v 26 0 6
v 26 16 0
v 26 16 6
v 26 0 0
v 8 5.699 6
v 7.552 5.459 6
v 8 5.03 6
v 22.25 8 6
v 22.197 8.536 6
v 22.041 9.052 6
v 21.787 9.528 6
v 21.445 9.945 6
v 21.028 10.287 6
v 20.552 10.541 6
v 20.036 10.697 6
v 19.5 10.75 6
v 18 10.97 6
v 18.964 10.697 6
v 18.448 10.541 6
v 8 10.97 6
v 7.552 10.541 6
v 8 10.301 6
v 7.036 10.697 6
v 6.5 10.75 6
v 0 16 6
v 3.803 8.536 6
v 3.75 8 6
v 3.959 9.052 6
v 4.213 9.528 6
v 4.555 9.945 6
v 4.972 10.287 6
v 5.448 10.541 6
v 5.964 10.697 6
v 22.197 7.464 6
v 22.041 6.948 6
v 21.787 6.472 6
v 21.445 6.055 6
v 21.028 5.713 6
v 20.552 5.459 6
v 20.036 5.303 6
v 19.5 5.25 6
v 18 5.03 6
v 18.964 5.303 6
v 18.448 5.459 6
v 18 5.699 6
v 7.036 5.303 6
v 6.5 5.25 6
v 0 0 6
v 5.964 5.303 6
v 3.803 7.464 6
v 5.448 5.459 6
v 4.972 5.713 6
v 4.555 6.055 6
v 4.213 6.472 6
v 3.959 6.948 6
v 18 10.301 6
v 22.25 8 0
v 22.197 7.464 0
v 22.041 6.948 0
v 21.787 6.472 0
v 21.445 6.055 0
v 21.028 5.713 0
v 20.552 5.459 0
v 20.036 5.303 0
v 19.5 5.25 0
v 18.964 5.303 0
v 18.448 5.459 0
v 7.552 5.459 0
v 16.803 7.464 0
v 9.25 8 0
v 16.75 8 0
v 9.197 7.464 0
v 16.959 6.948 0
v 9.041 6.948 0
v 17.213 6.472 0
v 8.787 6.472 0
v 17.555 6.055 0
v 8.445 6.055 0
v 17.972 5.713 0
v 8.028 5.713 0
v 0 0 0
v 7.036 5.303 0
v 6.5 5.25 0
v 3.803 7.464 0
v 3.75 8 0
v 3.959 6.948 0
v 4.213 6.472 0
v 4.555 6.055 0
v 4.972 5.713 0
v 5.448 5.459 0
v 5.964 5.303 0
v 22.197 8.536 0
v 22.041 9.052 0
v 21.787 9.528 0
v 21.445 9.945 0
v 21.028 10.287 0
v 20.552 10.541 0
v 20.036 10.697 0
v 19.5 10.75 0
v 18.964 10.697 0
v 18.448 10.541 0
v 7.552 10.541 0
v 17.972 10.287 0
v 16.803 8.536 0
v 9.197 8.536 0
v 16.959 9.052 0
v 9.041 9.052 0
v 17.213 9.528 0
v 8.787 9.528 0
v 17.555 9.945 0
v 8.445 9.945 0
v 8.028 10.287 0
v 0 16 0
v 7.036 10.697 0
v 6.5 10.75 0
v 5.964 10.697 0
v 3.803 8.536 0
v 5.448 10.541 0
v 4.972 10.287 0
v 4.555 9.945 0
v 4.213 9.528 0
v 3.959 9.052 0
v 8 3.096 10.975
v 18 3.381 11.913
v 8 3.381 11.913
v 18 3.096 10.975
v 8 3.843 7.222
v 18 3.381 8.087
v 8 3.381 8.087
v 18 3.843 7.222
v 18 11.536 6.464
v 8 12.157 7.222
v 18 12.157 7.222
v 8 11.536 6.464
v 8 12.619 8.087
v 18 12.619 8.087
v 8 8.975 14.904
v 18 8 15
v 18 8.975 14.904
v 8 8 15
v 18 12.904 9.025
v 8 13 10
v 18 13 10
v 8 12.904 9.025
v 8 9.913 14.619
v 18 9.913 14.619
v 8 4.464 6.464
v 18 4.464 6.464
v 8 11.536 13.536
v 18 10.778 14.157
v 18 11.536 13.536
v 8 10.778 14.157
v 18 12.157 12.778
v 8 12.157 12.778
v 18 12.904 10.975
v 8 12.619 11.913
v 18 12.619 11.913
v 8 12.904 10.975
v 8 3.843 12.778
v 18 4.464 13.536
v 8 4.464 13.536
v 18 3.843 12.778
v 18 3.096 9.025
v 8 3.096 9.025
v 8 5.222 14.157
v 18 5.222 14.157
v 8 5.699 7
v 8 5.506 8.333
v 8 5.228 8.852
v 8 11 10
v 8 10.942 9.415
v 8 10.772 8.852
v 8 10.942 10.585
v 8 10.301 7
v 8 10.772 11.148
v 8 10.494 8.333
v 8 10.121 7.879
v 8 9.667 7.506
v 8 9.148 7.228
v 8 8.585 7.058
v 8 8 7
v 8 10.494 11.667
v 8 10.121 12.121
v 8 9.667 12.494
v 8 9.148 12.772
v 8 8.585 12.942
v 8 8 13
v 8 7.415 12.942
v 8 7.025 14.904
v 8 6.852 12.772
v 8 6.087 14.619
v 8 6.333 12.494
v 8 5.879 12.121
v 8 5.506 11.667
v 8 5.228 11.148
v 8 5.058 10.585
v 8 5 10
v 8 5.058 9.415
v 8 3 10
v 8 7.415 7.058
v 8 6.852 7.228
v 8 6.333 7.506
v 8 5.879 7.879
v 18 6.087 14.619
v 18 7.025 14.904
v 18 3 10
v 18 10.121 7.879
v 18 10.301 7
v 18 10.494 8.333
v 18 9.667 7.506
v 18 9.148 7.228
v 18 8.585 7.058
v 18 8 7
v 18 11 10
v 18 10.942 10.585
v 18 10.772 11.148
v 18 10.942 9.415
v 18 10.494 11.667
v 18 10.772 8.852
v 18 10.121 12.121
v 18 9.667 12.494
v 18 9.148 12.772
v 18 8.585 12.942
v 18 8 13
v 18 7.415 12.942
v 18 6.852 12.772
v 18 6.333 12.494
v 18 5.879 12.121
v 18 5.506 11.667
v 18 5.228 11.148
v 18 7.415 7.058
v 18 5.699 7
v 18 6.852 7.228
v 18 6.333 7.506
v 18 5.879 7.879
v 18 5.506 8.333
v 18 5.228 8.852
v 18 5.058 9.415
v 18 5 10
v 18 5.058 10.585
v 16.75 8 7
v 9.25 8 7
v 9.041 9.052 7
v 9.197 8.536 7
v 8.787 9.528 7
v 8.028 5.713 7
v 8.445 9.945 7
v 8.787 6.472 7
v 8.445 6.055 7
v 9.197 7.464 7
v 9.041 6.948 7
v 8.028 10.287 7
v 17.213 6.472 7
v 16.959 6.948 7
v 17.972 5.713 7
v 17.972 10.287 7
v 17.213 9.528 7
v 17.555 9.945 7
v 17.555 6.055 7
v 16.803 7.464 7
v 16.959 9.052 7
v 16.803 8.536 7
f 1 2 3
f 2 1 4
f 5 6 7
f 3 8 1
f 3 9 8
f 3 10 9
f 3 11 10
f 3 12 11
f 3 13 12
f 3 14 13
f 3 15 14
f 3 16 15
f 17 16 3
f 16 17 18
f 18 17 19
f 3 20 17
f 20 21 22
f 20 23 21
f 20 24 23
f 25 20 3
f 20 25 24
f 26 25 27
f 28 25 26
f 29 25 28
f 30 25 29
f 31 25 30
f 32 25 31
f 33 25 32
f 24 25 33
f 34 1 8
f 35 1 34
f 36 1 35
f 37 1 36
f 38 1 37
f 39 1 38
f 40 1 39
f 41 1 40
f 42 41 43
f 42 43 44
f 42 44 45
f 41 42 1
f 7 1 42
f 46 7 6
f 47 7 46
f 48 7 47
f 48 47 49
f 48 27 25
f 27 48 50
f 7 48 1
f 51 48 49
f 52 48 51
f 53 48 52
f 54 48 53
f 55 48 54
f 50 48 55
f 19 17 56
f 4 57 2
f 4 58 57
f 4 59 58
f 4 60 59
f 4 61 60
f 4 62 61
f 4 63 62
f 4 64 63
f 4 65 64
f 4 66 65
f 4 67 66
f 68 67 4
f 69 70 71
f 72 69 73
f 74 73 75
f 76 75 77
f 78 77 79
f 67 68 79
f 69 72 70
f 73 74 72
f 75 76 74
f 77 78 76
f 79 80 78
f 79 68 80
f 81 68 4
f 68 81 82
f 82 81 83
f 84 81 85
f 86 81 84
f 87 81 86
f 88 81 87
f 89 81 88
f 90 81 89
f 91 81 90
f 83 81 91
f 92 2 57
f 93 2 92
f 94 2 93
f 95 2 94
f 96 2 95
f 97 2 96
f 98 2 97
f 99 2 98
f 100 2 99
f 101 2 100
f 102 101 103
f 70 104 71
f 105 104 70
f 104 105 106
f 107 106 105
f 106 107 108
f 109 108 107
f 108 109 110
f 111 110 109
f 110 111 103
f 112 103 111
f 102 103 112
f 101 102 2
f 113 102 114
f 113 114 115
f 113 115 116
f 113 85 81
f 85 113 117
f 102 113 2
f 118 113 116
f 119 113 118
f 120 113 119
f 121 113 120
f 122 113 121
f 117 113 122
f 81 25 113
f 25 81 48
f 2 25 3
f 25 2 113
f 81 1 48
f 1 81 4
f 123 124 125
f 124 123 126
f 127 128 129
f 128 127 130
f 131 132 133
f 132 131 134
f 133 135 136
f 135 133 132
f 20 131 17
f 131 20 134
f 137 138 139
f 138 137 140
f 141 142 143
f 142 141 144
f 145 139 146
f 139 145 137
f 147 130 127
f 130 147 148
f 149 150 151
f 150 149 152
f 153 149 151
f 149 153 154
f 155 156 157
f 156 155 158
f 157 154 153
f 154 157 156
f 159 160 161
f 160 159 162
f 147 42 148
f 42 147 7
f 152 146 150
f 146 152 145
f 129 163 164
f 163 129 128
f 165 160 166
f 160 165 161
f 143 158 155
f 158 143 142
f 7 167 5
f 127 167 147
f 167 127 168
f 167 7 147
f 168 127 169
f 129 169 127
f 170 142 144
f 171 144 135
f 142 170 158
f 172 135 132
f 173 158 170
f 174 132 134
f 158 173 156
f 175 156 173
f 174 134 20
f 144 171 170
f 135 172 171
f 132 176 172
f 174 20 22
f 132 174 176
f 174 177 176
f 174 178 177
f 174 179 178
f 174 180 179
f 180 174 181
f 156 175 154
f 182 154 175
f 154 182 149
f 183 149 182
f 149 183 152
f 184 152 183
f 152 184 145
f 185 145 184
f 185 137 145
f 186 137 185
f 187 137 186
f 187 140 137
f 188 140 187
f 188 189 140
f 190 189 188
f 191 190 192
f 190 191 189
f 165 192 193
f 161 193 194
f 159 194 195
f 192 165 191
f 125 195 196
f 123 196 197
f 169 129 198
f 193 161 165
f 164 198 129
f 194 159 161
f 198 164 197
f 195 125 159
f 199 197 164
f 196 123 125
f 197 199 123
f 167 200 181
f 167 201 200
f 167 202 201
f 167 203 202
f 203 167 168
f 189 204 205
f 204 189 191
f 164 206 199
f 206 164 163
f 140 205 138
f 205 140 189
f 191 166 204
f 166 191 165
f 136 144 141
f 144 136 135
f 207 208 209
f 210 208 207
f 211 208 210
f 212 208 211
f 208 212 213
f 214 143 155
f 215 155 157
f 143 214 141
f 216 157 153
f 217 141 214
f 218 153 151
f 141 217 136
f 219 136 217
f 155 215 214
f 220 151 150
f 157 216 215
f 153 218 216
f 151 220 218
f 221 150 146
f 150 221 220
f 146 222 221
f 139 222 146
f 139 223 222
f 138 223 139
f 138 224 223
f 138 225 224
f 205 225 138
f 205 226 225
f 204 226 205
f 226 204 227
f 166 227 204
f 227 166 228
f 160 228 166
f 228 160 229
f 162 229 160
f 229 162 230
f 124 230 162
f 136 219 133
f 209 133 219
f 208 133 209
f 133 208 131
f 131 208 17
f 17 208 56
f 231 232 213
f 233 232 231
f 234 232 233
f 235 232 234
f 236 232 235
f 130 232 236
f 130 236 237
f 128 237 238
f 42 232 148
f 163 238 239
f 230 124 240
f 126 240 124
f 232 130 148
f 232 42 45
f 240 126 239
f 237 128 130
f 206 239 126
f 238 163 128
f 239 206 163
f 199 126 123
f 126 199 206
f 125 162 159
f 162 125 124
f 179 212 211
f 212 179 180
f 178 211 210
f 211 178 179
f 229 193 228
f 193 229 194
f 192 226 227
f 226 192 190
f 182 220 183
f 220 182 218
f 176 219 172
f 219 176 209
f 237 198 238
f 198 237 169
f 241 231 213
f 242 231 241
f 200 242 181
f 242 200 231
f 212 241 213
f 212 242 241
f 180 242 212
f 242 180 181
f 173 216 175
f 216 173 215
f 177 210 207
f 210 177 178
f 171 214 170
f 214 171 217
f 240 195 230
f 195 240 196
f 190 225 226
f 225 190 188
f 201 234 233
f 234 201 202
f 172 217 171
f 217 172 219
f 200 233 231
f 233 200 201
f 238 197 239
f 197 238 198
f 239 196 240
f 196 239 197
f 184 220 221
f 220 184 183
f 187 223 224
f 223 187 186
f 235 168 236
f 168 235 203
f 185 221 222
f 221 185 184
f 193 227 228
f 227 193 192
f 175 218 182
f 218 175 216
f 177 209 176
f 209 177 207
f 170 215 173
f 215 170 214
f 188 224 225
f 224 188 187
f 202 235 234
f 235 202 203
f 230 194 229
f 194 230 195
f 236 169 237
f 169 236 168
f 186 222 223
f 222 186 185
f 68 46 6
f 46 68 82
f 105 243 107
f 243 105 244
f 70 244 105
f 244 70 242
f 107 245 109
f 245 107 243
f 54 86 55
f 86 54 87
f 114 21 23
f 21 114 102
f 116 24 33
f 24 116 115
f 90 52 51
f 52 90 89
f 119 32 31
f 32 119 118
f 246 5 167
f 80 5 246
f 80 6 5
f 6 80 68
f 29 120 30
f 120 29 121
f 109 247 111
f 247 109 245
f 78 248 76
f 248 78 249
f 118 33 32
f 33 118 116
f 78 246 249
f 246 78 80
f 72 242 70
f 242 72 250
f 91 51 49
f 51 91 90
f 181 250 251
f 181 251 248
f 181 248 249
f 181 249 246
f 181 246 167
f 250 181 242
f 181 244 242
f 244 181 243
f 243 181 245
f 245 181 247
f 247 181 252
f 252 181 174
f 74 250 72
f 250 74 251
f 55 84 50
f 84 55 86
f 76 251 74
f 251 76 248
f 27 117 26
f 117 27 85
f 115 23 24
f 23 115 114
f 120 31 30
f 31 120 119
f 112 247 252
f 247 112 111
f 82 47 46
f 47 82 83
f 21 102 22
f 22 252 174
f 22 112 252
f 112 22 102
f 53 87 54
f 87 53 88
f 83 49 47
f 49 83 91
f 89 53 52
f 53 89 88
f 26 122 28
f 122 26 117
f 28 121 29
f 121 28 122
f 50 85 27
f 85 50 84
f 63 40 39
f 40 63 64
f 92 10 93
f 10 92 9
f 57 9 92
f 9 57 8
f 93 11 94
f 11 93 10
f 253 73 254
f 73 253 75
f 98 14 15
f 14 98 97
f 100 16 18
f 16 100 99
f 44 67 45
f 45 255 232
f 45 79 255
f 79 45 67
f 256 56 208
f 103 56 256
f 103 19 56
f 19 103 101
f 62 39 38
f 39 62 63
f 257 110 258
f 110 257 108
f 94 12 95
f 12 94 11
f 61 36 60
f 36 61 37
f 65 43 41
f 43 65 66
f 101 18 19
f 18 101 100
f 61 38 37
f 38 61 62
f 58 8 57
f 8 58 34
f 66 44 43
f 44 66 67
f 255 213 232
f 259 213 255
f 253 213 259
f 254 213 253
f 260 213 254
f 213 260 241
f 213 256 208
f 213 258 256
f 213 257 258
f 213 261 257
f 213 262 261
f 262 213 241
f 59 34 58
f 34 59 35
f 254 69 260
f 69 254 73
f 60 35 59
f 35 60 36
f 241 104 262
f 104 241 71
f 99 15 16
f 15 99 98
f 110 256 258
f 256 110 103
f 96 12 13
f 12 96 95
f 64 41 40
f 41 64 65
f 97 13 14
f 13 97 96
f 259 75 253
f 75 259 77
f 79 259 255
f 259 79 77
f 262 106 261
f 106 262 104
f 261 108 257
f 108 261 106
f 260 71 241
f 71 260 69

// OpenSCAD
$fn = 32;

// ----------------------------------------------------------------------
// Cable clip: cable 6 mm, clamp 10 mm, base 26 mm
// ----------------------------------------------------------------------

// --- parameters (mm) ---
base_w = 26;              // base length, X
base_d = 16;              // base width, Y
base_t = 6;               // base thickness
clamp_d = 10;             // clamp outside diameter
wall_t = 2;               // clamp wall
cable_d = 6;              // cable opening
ring_w = 10;              // clamp width along the cable
screw_d = 5.5;            // screw clearance
sink = 1;                 // overlap of the clamp into the base

module base() {
  cube([base_w, base_d, base_t]);
}

module clamp() {
  translate([base_w / 2, base_d / 2, base_t + clamp_d / 2 - sink]) rotate([0, 90, 0])
    cylinder(h = ring_w, d = clamp_d, center = true);
}

difference() {
  union() {
    base();
    clamp();
  }
  translate([base_w / 2, base_d / 2, base_t + clamp_d / 2 - sink]) rotate([0, 90, 0]) translate([0, 0, -ring_w / 2 - 1]) cylinder(h = ring_w + 2, d = cable_d);
  translate([6.5, base_d / 2, -1]) cylinder(h = base_t + 2, d = screw_d);
  translate([19.5, base_d / 2, -1]) cylinder(h = base_t + 2, d = screw_d);
}
